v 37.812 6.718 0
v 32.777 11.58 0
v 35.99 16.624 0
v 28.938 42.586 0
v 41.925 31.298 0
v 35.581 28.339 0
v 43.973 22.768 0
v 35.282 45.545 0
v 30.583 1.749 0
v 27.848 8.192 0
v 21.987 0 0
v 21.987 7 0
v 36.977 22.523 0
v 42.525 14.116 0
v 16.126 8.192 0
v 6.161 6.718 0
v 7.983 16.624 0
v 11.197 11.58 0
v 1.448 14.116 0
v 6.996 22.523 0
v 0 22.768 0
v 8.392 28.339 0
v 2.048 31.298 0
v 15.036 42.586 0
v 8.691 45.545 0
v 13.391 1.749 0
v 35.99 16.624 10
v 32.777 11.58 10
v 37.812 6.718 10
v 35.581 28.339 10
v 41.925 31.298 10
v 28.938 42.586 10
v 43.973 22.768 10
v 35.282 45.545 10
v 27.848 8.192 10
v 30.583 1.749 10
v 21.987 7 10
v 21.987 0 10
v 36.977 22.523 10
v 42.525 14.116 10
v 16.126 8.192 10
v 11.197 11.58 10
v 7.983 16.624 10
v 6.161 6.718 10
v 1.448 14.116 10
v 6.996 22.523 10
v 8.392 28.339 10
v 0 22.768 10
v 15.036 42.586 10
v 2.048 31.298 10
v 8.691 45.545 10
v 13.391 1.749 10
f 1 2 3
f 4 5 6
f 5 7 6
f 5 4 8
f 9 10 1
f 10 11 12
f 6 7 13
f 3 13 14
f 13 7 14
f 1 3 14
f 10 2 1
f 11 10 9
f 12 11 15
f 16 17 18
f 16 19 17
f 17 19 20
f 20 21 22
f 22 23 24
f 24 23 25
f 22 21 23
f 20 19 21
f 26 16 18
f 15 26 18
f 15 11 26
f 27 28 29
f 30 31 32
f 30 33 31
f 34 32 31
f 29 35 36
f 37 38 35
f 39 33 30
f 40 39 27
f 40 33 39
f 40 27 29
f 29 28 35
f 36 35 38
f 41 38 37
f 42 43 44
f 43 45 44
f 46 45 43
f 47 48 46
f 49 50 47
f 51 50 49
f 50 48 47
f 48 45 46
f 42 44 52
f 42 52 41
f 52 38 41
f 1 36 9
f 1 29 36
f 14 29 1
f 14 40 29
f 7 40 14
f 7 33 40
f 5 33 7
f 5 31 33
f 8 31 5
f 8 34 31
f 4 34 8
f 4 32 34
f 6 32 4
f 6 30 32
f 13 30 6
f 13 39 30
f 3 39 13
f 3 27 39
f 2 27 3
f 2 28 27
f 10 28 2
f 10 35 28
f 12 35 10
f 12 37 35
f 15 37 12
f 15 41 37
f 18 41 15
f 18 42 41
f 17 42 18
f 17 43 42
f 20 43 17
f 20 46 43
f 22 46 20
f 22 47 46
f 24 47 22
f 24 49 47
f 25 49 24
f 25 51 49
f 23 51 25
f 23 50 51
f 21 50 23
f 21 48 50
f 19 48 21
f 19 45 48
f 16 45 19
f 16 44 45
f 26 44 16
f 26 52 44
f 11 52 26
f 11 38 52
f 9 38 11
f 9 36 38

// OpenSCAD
$fn = 32;

// ----------------------------------------------------------------------
// Clip blank: omega clip, 10 mm thick
// ----------------------------------------------------------------------

// --- parameters (mm) ---
profile_height = 10;      // extrusion height
profile_points = 26;      // points of the closed outline

profile = [[2.048, 31.298], [0, 22.768], [1.448, 14.116], [6.161, 6.718], [13.391, 1.749], [21.987, 0], [30.583, 1.749], [37.812, 6.718], [42.525, 14.116], [43.973, 22.768], [41.925, 31.298], [35.282, 45.545], [28.938, 42.586], [35.581, 28.339], [36.977, 22.523], [35.99, 16.624], [32.777, 11.58], [27.848, 8.192], [21.987, 7], [16.126, 8.192], [11.197, 11.58], [7.983, 16.624], [6.996, 22.523], [8.392, 28.339], [15.036, 42.586], [8.691, 45.545]];  // single closed polygon, 26 points, counter clockwise

// --- the one profile operation ---
linear_extrude(height = profile_height) polygon(points = profile);
